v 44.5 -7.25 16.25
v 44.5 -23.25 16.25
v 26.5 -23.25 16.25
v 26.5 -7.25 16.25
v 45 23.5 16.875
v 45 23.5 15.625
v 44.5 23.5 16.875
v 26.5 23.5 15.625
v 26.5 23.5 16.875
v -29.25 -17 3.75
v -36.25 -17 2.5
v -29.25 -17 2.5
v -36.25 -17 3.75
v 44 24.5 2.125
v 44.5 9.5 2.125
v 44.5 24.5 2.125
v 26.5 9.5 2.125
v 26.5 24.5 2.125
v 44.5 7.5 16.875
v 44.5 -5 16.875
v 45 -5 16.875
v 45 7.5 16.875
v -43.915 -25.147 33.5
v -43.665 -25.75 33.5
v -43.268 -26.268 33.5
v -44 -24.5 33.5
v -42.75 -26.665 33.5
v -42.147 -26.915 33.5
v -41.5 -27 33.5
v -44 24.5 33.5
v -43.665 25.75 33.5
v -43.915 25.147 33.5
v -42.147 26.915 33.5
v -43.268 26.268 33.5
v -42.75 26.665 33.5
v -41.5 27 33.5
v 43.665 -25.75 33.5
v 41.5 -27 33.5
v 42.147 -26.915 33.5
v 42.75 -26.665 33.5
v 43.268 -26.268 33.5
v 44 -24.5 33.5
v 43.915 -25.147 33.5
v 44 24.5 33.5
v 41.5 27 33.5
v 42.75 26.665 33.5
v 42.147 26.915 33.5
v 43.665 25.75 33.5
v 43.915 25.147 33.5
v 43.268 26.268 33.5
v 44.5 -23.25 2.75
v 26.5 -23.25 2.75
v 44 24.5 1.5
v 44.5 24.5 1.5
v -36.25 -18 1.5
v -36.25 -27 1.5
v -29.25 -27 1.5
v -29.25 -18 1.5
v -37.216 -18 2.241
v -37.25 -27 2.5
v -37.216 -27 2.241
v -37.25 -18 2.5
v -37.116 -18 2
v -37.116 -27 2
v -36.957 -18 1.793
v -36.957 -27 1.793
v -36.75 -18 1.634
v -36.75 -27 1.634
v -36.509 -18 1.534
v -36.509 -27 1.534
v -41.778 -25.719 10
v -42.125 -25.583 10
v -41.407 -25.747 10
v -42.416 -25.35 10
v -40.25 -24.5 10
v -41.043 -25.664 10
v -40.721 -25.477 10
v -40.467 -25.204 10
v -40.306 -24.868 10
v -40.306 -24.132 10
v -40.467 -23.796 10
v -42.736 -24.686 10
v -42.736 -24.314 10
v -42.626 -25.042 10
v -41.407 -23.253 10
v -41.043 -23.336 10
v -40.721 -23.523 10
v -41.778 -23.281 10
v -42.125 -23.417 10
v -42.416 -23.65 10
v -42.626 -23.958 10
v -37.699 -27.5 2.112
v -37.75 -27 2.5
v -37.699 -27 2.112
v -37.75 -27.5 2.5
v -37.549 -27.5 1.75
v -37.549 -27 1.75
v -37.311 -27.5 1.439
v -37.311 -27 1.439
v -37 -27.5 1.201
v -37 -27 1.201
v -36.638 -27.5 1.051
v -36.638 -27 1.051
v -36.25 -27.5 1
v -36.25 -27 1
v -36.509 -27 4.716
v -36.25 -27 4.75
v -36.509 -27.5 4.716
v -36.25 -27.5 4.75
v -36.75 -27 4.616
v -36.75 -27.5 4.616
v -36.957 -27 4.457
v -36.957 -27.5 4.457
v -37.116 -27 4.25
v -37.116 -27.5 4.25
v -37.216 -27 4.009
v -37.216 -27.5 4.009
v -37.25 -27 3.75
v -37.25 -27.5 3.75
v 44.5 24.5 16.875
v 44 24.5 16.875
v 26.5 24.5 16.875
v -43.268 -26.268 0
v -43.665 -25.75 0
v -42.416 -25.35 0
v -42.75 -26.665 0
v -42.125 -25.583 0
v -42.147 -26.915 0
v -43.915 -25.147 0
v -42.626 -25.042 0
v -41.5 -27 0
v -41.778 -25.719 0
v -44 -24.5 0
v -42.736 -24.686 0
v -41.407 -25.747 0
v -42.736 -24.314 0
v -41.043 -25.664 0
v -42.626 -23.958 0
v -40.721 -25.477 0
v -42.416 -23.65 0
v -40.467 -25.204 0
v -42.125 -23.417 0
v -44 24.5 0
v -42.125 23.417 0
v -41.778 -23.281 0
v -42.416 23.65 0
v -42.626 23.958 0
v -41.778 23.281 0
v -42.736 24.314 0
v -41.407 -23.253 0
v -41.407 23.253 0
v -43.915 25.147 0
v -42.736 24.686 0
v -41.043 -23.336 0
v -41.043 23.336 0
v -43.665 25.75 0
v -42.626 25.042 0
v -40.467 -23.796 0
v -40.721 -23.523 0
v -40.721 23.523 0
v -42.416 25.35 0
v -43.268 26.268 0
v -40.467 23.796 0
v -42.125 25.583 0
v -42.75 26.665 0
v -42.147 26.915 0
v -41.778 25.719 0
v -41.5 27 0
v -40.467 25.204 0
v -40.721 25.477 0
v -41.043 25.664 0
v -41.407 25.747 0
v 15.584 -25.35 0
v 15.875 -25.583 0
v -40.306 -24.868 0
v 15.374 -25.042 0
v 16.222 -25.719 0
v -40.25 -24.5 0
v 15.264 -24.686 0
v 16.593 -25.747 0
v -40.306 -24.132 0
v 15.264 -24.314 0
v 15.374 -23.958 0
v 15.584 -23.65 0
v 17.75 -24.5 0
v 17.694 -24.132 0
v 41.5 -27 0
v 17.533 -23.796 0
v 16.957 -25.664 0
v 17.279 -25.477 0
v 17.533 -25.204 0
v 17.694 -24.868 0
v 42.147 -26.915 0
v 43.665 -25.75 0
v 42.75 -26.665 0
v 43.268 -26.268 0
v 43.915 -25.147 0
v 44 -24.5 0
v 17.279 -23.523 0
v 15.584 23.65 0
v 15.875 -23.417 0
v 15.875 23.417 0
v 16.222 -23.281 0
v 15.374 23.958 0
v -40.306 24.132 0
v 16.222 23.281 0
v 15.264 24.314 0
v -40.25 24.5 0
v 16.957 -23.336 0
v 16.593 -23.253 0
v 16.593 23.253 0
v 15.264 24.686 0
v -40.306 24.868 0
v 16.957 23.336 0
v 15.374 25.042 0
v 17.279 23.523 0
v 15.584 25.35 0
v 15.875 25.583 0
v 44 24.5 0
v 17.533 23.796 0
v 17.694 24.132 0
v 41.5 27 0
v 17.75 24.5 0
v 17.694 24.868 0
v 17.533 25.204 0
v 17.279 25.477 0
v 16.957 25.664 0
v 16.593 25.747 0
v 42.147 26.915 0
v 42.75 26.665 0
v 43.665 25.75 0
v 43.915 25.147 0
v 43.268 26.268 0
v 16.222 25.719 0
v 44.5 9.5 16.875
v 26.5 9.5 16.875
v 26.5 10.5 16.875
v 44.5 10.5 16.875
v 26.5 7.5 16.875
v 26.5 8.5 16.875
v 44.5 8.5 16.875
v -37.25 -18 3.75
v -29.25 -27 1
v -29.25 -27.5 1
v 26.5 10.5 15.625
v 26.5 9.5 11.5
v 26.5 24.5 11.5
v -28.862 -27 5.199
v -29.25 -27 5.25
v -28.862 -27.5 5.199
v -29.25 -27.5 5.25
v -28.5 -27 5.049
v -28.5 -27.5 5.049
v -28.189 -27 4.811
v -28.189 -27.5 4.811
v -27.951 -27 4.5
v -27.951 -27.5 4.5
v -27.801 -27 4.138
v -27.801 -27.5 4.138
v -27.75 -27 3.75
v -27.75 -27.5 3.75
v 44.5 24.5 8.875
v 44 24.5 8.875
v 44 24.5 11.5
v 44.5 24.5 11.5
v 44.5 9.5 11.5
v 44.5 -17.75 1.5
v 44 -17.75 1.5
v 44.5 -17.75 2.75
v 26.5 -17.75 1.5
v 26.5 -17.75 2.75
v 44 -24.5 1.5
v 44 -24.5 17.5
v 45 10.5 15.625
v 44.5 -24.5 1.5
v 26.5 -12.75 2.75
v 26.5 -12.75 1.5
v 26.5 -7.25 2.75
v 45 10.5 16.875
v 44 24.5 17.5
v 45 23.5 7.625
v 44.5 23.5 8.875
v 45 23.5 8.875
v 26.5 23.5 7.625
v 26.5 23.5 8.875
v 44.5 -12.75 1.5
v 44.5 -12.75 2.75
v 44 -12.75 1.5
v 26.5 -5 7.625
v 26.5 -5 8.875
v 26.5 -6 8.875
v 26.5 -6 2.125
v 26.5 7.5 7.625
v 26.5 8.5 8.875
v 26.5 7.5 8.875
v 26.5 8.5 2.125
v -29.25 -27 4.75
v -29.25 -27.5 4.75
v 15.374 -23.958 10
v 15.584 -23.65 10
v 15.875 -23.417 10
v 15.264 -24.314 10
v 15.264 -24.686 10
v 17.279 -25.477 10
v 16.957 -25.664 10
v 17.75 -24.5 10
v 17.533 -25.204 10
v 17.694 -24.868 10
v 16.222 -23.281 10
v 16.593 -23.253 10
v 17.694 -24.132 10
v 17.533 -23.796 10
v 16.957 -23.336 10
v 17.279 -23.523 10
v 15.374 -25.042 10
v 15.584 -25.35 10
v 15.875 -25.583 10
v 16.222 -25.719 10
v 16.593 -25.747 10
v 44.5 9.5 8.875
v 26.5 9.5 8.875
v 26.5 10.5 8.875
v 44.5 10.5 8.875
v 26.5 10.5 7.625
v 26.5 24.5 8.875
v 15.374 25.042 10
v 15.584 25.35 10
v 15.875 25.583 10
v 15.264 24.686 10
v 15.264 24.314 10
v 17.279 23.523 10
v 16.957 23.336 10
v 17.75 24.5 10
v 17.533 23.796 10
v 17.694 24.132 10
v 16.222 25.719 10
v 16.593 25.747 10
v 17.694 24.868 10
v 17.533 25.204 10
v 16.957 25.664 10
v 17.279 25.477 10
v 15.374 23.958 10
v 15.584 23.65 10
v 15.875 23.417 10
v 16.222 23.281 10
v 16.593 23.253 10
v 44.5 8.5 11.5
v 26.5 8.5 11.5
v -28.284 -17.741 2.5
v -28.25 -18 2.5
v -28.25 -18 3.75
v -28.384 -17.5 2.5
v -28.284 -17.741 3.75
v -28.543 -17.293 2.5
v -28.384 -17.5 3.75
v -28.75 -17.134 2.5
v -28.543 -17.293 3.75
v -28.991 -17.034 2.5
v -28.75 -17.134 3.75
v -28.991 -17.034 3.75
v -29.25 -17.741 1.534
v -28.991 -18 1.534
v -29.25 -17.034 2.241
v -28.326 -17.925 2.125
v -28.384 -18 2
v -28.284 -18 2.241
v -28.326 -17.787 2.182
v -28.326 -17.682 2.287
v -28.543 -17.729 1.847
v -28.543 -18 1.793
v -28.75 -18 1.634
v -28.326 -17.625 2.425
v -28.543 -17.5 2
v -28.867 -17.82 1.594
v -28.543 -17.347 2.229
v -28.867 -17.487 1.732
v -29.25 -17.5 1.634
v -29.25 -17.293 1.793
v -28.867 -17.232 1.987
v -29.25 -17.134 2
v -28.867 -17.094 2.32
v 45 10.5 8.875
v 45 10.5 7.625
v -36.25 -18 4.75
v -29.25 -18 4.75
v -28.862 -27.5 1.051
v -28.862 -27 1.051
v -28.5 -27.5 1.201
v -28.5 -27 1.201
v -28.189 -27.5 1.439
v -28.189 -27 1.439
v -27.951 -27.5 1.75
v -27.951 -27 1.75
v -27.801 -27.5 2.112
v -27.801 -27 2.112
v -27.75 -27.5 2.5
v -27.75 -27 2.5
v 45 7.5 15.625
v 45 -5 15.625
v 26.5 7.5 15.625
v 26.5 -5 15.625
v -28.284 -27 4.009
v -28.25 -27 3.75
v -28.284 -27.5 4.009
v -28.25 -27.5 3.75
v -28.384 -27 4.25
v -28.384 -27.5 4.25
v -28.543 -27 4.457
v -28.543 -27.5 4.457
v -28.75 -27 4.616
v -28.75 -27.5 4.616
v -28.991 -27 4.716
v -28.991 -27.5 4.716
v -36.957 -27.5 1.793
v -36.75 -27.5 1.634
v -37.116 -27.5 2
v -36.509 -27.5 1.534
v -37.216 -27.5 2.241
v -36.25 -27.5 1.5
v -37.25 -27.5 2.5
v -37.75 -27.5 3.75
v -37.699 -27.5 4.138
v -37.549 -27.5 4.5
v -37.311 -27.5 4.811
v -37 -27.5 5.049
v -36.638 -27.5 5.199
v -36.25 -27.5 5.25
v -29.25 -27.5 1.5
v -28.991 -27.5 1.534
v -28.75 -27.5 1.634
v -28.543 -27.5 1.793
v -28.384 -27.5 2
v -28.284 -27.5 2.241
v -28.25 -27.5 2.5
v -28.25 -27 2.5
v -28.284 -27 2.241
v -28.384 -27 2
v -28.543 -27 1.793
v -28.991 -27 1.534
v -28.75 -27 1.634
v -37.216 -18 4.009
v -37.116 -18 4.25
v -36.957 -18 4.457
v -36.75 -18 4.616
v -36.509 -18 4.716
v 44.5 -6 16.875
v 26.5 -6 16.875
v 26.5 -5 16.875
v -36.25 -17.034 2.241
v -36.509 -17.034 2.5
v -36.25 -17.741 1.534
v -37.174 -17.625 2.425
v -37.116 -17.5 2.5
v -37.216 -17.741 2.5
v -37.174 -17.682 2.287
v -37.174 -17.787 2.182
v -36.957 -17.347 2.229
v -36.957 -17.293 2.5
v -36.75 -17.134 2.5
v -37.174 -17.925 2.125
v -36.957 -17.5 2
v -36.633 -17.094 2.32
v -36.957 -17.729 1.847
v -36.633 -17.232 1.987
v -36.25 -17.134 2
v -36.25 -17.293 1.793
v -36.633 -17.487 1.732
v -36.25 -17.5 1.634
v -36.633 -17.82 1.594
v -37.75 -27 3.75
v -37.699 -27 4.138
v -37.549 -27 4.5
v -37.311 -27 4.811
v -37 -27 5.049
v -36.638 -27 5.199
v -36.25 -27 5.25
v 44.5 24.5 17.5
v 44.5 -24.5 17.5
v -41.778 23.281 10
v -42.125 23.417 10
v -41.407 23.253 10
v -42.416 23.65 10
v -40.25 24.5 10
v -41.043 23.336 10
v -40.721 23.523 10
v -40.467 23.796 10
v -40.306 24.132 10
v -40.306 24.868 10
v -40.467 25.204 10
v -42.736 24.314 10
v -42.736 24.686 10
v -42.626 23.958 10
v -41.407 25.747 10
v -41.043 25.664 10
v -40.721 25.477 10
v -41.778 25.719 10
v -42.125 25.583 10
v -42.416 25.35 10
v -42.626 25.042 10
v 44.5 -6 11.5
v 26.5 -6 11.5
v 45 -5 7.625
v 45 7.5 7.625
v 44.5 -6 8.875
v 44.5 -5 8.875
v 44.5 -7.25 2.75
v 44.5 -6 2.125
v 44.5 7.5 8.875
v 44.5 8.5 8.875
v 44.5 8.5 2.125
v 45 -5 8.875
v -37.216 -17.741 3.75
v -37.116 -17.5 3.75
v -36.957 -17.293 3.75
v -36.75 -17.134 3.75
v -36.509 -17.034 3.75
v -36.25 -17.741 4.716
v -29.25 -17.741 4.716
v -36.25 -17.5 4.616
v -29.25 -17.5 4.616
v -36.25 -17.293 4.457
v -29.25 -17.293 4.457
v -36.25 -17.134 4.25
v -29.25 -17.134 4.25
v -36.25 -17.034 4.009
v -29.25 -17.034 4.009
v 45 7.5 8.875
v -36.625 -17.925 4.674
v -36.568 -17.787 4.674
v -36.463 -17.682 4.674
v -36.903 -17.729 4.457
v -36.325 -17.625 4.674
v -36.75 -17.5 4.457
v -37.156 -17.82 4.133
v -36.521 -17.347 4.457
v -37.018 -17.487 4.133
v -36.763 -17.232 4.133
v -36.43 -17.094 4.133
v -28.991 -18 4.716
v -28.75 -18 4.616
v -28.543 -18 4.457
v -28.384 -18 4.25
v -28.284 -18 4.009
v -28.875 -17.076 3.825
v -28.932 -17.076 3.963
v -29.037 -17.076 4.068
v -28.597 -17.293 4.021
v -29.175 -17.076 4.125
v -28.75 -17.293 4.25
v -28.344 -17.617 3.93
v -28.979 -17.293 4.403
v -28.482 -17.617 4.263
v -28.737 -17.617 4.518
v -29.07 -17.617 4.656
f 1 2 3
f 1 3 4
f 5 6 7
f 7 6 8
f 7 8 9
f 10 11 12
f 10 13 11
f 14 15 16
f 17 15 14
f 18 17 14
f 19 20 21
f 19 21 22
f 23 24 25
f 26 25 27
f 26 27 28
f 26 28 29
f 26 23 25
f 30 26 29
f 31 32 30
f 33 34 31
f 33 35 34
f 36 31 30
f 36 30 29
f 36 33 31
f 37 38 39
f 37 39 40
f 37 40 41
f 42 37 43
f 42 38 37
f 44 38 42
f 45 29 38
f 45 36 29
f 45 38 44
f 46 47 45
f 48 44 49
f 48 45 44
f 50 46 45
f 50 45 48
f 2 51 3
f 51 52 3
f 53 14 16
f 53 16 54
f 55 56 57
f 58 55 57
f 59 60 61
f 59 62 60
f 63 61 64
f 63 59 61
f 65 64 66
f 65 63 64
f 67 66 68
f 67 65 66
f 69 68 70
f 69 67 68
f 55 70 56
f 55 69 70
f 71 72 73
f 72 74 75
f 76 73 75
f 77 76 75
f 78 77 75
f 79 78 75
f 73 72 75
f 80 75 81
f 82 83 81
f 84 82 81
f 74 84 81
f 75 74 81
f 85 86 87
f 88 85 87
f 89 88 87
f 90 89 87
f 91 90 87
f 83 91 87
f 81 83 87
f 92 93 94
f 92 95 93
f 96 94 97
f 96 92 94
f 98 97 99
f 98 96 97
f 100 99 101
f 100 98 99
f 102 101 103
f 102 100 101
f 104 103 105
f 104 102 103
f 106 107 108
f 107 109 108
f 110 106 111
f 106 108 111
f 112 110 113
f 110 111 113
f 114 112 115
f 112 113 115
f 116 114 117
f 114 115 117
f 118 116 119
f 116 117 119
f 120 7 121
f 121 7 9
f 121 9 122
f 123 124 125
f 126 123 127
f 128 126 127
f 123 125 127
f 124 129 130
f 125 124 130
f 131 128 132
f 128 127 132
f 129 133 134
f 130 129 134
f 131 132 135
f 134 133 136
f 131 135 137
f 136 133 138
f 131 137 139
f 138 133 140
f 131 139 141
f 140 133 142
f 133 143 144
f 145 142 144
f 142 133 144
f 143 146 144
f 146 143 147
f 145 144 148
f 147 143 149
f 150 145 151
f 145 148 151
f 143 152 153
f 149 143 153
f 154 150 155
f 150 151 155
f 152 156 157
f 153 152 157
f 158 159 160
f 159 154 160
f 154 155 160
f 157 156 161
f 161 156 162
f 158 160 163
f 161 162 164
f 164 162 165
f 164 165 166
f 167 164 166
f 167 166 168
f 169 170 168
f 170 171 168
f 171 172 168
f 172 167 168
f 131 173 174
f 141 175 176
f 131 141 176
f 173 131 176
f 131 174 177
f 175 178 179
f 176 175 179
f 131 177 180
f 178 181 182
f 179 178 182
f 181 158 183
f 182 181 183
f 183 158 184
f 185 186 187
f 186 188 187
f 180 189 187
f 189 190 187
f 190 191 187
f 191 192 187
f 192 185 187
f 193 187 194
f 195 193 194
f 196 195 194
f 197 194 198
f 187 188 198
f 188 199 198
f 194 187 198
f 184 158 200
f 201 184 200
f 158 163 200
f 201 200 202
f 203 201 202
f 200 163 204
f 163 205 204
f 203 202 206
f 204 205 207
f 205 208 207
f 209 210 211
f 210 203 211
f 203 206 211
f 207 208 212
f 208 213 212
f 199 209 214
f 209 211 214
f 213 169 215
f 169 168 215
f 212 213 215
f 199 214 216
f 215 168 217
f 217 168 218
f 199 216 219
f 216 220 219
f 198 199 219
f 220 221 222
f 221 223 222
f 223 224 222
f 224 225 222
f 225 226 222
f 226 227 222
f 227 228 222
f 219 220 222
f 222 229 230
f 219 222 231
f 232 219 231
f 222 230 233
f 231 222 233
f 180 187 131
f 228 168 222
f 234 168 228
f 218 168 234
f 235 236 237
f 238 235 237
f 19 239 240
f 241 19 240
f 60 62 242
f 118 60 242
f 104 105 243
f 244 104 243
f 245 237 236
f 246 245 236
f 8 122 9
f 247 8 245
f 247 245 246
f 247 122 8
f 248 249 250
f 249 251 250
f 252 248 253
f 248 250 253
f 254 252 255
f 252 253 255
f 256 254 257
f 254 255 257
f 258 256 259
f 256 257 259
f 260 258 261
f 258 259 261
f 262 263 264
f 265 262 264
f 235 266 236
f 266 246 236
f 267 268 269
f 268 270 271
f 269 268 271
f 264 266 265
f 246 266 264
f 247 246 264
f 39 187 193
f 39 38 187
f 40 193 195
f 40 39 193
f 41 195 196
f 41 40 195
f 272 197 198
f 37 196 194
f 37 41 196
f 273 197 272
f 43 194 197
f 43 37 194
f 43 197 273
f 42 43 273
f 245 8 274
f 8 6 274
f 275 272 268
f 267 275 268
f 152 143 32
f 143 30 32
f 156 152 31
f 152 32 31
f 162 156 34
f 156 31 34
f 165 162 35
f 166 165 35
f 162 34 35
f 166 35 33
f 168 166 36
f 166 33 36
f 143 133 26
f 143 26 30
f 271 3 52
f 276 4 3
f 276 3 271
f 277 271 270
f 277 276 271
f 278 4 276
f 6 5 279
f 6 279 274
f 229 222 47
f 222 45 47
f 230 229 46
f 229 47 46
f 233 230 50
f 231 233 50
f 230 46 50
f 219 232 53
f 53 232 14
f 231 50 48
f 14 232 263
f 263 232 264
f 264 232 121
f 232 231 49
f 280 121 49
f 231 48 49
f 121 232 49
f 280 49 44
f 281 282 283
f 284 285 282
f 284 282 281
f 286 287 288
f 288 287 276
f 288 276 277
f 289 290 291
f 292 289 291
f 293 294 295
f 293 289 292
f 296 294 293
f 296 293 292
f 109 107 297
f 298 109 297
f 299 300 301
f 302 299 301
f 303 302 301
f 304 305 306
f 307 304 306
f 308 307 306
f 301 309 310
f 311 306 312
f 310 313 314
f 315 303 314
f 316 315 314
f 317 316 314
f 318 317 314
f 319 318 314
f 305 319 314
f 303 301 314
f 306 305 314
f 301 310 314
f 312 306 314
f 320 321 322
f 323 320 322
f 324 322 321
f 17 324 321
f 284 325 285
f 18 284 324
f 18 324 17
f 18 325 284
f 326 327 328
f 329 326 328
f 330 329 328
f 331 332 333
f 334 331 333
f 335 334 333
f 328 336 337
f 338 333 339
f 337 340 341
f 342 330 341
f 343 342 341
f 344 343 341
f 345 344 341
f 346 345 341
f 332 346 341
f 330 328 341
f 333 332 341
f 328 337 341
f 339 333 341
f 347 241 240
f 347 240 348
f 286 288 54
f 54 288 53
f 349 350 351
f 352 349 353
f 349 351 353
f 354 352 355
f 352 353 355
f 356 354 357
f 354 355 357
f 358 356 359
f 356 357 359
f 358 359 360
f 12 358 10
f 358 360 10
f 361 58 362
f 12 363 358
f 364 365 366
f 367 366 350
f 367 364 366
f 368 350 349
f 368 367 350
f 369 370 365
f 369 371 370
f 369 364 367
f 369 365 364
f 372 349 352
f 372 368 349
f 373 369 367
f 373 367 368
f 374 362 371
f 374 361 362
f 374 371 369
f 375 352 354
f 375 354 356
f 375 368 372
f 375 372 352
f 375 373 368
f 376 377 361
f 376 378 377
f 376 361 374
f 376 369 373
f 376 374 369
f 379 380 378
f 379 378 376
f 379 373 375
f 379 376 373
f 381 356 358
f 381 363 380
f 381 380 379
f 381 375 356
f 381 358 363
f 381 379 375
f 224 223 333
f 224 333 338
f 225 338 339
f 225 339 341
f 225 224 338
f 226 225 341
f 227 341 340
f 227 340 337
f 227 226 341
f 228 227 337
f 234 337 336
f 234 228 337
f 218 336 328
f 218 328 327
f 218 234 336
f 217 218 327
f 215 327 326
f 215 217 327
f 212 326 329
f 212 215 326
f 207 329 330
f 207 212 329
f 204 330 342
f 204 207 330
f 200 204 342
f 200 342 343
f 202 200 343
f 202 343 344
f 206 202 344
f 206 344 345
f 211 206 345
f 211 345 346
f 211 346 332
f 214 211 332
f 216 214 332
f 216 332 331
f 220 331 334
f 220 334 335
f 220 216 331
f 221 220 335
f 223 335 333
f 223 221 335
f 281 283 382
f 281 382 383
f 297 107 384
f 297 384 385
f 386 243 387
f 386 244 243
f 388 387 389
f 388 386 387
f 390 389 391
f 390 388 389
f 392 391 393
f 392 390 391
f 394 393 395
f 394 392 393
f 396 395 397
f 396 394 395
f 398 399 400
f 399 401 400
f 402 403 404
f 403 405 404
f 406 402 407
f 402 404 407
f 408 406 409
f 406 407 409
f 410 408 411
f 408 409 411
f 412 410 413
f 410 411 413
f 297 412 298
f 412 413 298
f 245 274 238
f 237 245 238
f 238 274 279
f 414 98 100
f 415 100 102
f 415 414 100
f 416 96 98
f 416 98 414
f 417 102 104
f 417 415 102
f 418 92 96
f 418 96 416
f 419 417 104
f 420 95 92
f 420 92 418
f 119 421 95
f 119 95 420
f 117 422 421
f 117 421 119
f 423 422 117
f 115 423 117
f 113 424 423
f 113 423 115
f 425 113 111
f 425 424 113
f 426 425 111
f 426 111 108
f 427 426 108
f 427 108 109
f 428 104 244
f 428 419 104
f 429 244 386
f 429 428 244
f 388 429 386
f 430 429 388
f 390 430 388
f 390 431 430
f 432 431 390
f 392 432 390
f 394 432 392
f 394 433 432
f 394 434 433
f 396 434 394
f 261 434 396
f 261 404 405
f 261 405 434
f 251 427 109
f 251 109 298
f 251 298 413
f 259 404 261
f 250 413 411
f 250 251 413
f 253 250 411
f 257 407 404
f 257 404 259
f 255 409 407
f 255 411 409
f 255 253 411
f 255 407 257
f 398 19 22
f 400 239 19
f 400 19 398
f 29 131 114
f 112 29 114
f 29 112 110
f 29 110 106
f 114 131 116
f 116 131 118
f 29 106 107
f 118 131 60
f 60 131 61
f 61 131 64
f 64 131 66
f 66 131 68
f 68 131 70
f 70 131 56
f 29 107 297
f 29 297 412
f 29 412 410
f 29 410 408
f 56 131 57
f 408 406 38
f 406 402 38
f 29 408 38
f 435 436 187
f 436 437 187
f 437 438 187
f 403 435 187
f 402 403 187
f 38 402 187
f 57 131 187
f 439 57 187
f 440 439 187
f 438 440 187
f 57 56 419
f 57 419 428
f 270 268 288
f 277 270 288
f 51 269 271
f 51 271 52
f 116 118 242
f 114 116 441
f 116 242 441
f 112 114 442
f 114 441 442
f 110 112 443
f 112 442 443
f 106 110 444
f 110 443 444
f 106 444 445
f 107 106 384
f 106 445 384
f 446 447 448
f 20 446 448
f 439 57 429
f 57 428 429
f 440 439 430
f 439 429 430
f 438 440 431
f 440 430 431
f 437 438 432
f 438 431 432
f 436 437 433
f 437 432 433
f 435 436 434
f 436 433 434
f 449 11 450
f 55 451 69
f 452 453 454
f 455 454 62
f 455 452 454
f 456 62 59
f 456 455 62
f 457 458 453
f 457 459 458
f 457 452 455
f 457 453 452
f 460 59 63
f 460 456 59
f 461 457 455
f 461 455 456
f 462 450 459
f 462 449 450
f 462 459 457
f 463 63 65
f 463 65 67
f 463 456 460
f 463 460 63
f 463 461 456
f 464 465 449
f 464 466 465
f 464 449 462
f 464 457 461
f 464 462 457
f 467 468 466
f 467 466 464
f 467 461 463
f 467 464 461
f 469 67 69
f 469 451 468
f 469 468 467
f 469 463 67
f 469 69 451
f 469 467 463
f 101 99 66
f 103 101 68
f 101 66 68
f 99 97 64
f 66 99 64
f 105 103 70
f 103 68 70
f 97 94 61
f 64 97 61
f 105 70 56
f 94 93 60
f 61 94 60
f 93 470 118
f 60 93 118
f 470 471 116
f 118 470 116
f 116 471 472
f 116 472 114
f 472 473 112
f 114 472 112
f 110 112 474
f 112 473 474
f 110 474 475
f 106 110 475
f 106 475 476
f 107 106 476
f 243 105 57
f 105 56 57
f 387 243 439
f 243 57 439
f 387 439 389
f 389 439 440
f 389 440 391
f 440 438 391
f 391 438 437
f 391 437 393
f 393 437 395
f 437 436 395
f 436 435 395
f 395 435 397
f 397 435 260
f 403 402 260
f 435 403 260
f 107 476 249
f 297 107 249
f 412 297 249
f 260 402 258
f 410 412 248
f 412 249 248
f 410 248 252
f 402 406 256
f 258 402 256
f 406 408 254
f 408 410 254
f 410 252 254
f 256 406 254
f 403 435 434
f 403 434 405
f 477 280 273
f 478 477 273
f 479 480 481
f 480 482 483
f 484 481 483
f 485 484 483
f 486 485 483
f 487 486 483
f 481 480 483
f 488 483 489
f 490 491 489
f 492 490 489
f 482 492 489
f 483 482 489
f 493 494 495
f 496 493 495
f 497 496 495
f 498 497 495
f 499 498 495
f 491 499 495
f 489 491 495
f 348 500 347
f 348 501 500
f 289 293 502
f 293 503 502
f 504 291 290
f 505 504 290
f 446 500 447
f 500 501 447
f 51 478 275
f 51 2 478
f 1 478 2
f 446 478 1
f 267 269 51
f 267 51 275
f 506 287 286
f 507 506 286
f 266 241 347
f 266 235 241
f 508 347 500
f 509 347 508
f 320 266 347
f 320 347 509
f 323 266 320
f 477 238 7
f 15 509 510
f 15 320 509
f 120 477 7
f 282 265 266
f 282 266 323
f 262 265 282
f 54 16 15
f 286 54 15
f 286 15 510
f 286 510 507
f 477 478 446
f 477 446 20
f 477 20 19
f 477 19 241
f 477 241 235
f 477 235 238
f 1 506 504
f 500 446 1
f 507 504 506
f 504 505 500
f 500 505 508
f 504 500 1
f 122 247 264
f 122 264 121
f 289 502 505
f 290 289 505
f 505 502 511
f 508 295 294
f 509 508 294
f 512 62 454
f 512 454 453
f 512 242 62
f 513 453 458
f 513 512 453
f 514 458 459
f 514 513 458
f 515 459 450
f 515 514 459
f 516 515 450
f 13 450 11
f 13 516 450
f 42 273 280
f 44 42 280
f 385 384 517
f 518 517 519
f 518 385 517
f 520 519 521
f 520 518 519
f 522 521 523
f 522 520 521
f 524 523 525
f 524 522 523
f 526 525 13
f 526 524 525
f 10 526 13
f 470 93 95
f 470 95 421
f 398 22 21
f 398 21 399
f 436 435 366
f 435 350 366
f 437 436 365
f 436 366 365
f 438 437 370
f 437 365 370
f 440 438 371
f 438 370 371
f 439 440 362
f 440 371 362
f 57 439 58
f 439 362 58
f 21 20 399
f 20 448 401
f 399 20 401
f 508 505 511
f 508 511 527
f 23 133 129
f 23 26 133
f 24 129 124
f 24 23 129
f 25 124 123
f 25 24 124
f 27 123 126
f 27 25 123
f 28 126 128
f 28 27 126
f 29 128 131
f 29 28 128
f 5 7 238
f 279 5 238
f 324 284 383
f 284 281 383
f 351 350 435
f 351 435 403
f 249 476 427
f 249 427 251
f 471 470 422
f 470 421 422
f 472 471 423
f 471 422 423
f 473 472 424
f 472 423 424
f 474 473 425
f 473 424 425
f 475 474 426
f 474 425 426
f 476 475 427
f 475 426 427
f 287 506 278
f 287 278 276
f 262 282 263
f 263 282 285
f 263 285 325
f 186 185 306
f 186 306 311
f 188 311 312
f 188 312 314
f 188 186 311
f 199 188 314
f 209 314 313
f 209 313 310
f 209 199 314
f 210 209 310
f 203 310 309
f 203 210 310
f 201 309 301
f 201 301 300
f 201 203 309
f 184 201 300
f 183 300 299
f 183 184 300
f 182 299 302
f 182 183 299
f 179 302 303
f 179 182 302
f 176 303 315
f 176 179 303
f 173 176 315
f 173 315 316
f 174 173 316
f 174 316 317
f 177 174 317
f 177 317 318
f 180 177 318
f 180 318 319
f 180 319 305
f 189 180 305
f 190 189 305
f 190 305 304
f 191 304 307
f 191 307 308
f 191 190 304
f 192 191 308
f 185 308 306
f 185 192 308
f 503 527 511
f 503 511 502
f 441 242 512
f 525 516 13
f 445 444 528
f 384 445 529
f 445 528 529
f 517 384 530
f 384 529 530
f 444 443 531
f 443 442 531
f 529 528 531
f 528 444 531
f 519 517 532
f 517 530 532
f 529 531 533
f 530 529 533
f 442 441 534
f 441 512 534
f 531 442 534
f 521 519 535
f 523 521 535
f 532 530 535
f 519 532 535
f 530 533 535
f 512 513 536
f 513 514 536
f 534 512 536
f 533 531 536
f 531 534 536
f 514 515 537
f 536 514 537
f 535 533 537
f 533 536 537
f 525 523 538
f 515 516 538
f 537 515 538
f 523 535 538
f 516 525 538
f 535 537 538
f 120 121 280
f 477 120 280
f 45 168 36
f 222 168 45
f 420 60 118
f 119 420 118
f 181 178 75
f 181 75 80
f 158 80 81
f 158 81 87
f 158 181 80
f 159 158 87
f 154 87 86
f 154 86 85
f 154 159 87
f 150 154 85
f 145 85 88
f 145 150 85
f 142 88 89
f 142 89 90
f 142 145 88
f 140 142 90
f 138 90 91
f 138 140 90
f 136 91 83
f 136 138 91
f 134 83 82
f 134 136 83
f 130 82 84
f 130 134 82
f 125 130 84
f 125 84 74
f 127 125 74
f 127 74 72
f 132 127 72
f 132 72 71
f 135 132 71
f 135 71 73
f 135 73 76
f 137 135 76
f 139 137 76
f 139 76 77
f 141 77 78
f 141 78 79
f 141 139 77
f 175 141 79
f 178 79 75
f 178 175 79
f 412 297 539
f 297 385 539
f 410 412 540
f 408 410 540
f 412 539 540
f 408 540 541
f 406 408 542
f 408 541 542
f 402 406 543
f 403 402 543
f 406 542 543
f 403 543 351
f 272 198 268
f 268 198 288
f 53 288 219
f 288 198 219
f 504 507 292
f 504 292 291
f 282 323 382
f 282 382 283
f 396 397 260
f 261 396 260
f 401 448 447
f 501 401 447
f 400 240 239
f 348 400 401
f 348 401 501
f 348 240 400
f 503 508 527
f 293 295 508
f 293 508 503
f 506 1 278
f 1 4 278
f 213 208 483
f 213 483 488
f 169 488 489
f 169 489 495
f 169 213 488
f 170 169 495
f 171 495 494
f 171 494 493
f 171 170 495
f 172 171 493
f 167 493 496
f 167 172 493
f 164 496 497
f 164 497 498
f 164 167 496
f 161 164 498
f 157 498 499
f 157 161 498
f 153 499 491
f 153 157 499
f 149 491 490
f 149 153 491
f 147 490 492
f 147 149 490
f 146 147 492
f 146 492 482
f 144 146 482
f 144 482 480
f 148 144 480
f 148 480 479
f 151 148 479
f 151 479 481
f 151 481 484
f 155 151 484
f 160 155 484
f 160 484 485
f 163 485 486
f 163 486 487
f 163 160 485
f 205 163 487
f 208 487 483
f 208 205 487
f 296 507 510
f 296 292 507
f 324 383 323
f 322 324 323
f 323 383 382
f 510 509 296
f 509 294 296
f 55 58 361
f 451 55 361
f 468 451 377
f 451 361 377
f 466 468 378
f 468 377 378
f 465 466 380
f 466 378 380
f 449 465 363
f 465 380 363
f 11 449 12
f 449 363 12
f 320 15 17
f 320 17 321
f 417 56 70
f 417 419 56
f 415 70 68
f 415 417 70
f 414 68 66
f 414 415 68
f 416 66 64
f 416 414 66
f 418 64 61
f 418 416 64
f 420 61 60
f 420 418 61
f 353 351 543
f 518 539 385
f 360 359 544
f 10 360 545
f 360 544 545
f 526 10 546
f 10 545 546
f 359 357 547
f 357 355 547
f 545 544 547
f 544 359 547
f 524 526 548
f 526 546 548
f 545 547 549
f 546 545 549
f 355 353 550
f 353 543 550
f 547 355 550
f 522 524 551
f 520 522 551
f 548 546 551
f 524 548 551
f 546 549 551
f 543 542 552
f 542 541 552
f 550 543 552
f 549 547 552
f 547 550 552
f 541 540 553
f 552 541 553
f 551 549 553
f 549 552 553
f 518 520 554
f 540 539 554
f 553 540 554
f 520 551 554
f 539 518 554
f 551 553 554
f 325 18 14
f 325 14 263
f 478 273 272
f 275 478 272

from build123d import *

# Parameters (mm, degrees)
ESQUISSE1_W             = 88
ESQUISSE1_H             = 54
ESQUISSE1_R             = 1.25
BOSS_EXTRU_1_DEPTH      = 33.5
ESQUISSE1_3_R           = 1.25
ENL_V_MAT_EXTRU_1_DEPTH = 10
CONG_1_R                = 2.5
ENL_V_MAT_EXTRU_2_DEPTH = 17.5
ESQUISSE2_7_W           = 2
ESQUISSE2_7_H           = 14.5
ESQUISSE2_7_W_2         = 0.625
ESQUISSE2_7_W_3         = 5.375
ESQUISSE2_7_H_2         = 0.5
ESQUISSE2_7_W_4         = 6.75
ESQUISSE2_7_H_3         = 15
BOSS_EXTRU_3_DEPTH      = 0.5
ESQUISSE2_8_W           = 1.25
ESQUISSE2_8_H           = 12.5
ESQUISSE2_8_H_2         = 13
BOSS_EXTRU_4_DEPTH      = 1
ESQUISSE3_W             = 9
ESQUISSE3_H             = 3.25
ENL_V_MAT_EXTRU_3_DEPTH = 10
ESQUISSE3_2_W           = 10
ESQUISSE3_2_H           = 4.25
ESQUISSE3_2_W_2         = 9
ESQUISSE3_2_H_2         = 3.25
BOSS_EXTRU_5_DEPTH      = 0.5
CONG_2_R                = 1.5
CONG_3_R                = 1
CONG_4_R                = 1


with BuildPart() as part:
    # Esquisse1 → Boss.-Extru.1 (new body)
    with BuildSketch(Plane.XY):
        Rectangle(ESQUISSE1_W, ESQUISSE1_H)
        with Locations((16.5, 24.5)):
            Circle(ESQUISSE1_R, mode=Mode.SUBTRACT)
        with Locations((16.5, -24.5)):
            Circle(ESQUISSE1_R, mode=Mode.SUBTRACT)
        with Locations((-41.5, -24.5)):
            Circle(ESQUISSE1_R, mode=Mode.SUBTRACT)
        with Locations((-41.5, 24.5)):
            Circle(ESQUISSE1_R, mode=Mode.SUBTRACT)
        with Locations((16.5, -24.5)):
            Circle(ESQUISSE1_R)
        with Locations((16.5, 24.5)):
            Circle(ESQUISSE1_R)
        with Locations((-41.5, 24.5)):
            Circle(ESQUISSE1_R)
        with Locations((-41.5, -24.5)):
            Circle(ESQUISSE1_R)
    extrude(amount=BOSS_EXTRU_1_DEPTH)

    # Esquisse1_3 → Enl_v. mat.-Extru.1 (cut)
    with BuildSketch(Plane.XY):
        with Locations((16.5, 24.5)):
            Circle(ESQUISSE1_3_R)
        with Locations((-41.5, 24.5)):
            Circle(ESQUISSE1_3_R)
        with Locations((-41.5, -24.5)):
            Circle(ESQUISSE1_3_R)
        with Locations((16.5, -24.5)):
            Circle(ESQUISSE1_3_R)
    extrude(amount=ENL_V_MAT_EXTRU_1_DEPTH, mode=Mode.SUBTRACT)

    # Cong_1
    cong_1_edges = [part.edges().sort_by_distance(p)[0] for p in [
        (44, -27, 16.75),
        (-44, -27, 16.75),
        (-44, 27, 16.75),
        (44, 27, 16.75),
    ]]
    fillet(cong_1_edges, radius=CONG_1_R)

    # Esquisse2 → Enl_v. mat.-Extru.2 (cut)
    with BuildSketch(Plane(origin=(44, 0, 0), x_dir=(0, 0, -1), z_dir=(1, 0, 0))):
        Polygon((-2.75, -17.75), (-1.5, -17.75), (-1.5, -12.75), (-2.75, -12.75), (-2.75, -7.25), (-16.25, -7.25), (-16.25, -23.25), (-2.75, -23.25), align=None)
        Polygon((-16.875, -5), (-16.875, -6), (-11.5, -6), (-11.5, 8.5), (-16.875, 8.5), (-16.875, 7.5), (-15.625, 7.5), (-15.625, -5), align=None)
        Polygon((-8.875, -6), (-2.125, -6), (-2.125, 8.5), (-8.875, 8.5), (-8.875, 7.5), (-7.625, 7.5), (-7.625, -5), (-8.875, -5), align=None)
        Polygon((-16.875, 10.5), (-16.875, 9.5), (-11.5, 9.5), (-11.5, 24.5), (-16.875, 24.5), (-16.875, 23.5), (-15.625, 23.5), (-15.625, 10.5), align=None)
        Polygon((-8.875, 9.5), (-2.125, 9.5), (-2.125, 24.5), (-8.875, 24.5), (-8.875, 23.5), (-7.625, 23.5), (-7.625, 10.5), (-8.875, 10.5), align=None)
    extrude(amount=-ENL_V_MAT_EXTRU_2_DEPTH, mode=Mode.SUBTRACT)

    # Esquisse2_7 → Boss.-Extru.3 (add)
    with BuildSketch(Plane(origin=(44, 0, 0), x_dir=(0, 0, -1), z_dir=(1, 0, 0))):
        Polygon((-17.5, -24.5), (-1.5, -24.5), (-1.5, -17.75), (-2.75, -17.75), (-2.75, -23.25), (-16.25, -23.25), (-16.25, -7.25), (-2.75, -7.25), (-2.75, -12.75), (-1.5, -12.75), (-1.5, -6), (-2.125, -6), (-8.875, -6), (-9.5, -6), (-11.5, -6), (-16.875, -6), (-17.5, -6), align=None)
        with Locations((-10.5, 1.25)):
            Rectangle(ESQUISSE2_7_W, ESQUISSE2_7_H)
        Polygon((-9.5, 8.5), (-9.5, -6), (-8.875, -6), (-8.875, -5), (-8.875, 7.5), (-8.875, 8.5), align=None)
        with Locations((-1.8125, 1.25)):
            Rectangle(ESQUISSE2_7_W_2, ESQUISSE2_7_H)
        Polygon((-17.5, 8.5), (-17.5, -6), (-16.875, -6), (-16.875, -5), (-16.875, 7.5), (-16.875, 8.5), align=None)
        with Locations((-14.1875, 8.75)):
            Rectangle(ESQUISSE2_7_W_3, ESQUISSE2_7_H_2)
        with Locations((-17.1875, 8.75)):
            Rectangle(ESQUISSE2_7_W_2, ESQUISSE2_7_H_2)
        with Locations((-17.1875, 9.25)):
            Rectangle(ESQUISSE2_7_W_2, ESQUISSE2_7_H_2)
        with Locations((-14.1875, 9.25)):
            Rectangle(ESQUISSE2_7_W_3, ESQUISSE2_7_H_2)
        with Locations((-10.5, 9.25)):
            Rectangle(ESQUISSE2_7_W, ESQUISSE2_7_H_2)
        with Locations((-10.5, 8.75)):
            Rectangle(ESQUISSE2_7_W, ESQUISSE2_7_H_2)
        with Locations((-9.1875, 8.75)):
            Rectangle(ESQUISSE2_7_W_2, ESQUISSE2_7_H_2)
        with Locations((-9.1875, 9.25)):
            Rectangle(ESQUISSE2_7_W_2, ESQUISSE2_7_H_2)
        with Locations((-5.5, 8.75)):
            Rectangle(ESQUISSE2_7_W_4, ESQUISSE2_7_H_2)
        with Locations((-5.5, 9.25)):
            Rectangle(ESQUISSE2_7_W_4, ESQUISSE2_7_H_2)
        with Locations((-1.8125, 8.75)):
            Rectangle(ESQUISSE2_7_W_2, ESQUISSE2_7_H_2)
        with Locations((-1.8125, 9.25)):
            Rectangle(ESQUISSE2_7_W_2, ESQUISSE2_7_H_2)
        with Locations((-1.8125, 17)):
            Rectangle(ESQUISSE2_7_W_2, ESQUISSE2_7_H_3)
        Polygon((-9.5, 24.5), (-9.5, 9.5), (-8.875, 9.5), (-8.875, 10.5), (-8.875, 23.5), (-8.875, 24.5), align=None)
        with Locations((-10.5, 17)):
            Rectangle(ESQUISSE2_7_W, ESQUISSE2_7_H_3)
        Polygon((-17.5, 24.5), (-17.5, 9.5), (-16.875, 9.5), (-16.875, 10.5), (-16.875, 23.5), (-16.875, 24.5), align=None)
    extrude(amount=BOSS_EXTRU_3_DEPTH)

    # Esquisse2_8 → Boss.-Extru.4 (add)
    with BuildSketch(Plane(origin=(44, 0, 0), x_dir=(0, 0, -1), z_dir=(1, 0, 0))):
        with Locations((-16.25, 1.25)):
            Rectangle(ESQUISSE2_8_W, ESQUISSE2_8_H)
        with Locations((-8.25, 1.25)):
            Rectangle(ESQUISSE2_8_W, ESQUISSE2_8_H)
        with Locations((-8.25, 17)):
            Rectangle(ESQUISSE2_8_W, ESQUISSE2_8_H_2)
        Polygon((-16.875, 23.5), (-16.875, 10.5), (-15.625, 10.5), (-15.625, 23), (-15.625, 23.5), align=None)
    extrude(amount=BOSS_EXTRU_4_DEPTH)

    # Esquisse3 → Enl_v. mat.-Extru.3 (cut)
    with BuildSketch(Plane.XZ.offset(27)):
        with Locations((-32.75, 3.125)):
            Rectangle(ESQUISSE3_W, ESQUISSE3_H)
    extrude(amount=-ENL_V_MAT_EXTRU_3_DEPTH, mode=Mode.SUBTRACT)

    # Cong_4
    cong_4_edges = [part.edges().sort_by_distance(p)[0] for p in [
        (-28.25, -22, 4.75),
        (-32.75, -17, 1.5),
        (-28.25, -22, 1.5),
        (-37.25, -17, 3.125),
        (-37.25, -22, 1.5),
        (-37.25, -22, 4.75),
        (-28.25, -17, 3.125),
        (-32.75, -17, 4.75),
    ]]
    fillet(cong_4_edges, radius=CONG_4_R)


with BuildPart() as body_2:
    # Esquisse3_2 → Boss.-Extru.5 (new body)
    with BuildSketch(Plane.XZ.offset(27)):
        with Locations((-32.75, 3.125)):
            Rectangle(ESQUISSE3_2_W, ESQUISSE3_2_H)
        with Locations((-32.75, 3.125)):
            Rectangle(ESQUISSE3_2_W_2, ESQUISSE3_2_H_2, mode=Mode.SUBTRACT)
    extrude(amount=BOSS_EXTRU_5_DEPTH)

    # Cong_2
    cong_2_edges = [body_2.edges().sort_by_distance(p)[0] for p in [
        (-27.75, -27.25, 5.25),
        (-27.75, -27.25, 1),
        (-37.75, -27.25, 1),
        (-37.75, -27.25, 5.25),
    ]]
    fillet(cong_2_edges, radius=CONG_2_R)

    # Cong_3
    cong_3_edges = [body_2.edges().sort_by_distance(p)[0] for p in [
        (-37.25, -27.25, 4.75),
        (-37.25, -27.25, 1.5),
        (-28.25, -27.25, 1.5),
        (-28.25, -27.25, 4.75),
    ]]
    fillet(cong_3_edges, radius=CONG_3_R)


solid = Compound([part.part, body_2.part])
